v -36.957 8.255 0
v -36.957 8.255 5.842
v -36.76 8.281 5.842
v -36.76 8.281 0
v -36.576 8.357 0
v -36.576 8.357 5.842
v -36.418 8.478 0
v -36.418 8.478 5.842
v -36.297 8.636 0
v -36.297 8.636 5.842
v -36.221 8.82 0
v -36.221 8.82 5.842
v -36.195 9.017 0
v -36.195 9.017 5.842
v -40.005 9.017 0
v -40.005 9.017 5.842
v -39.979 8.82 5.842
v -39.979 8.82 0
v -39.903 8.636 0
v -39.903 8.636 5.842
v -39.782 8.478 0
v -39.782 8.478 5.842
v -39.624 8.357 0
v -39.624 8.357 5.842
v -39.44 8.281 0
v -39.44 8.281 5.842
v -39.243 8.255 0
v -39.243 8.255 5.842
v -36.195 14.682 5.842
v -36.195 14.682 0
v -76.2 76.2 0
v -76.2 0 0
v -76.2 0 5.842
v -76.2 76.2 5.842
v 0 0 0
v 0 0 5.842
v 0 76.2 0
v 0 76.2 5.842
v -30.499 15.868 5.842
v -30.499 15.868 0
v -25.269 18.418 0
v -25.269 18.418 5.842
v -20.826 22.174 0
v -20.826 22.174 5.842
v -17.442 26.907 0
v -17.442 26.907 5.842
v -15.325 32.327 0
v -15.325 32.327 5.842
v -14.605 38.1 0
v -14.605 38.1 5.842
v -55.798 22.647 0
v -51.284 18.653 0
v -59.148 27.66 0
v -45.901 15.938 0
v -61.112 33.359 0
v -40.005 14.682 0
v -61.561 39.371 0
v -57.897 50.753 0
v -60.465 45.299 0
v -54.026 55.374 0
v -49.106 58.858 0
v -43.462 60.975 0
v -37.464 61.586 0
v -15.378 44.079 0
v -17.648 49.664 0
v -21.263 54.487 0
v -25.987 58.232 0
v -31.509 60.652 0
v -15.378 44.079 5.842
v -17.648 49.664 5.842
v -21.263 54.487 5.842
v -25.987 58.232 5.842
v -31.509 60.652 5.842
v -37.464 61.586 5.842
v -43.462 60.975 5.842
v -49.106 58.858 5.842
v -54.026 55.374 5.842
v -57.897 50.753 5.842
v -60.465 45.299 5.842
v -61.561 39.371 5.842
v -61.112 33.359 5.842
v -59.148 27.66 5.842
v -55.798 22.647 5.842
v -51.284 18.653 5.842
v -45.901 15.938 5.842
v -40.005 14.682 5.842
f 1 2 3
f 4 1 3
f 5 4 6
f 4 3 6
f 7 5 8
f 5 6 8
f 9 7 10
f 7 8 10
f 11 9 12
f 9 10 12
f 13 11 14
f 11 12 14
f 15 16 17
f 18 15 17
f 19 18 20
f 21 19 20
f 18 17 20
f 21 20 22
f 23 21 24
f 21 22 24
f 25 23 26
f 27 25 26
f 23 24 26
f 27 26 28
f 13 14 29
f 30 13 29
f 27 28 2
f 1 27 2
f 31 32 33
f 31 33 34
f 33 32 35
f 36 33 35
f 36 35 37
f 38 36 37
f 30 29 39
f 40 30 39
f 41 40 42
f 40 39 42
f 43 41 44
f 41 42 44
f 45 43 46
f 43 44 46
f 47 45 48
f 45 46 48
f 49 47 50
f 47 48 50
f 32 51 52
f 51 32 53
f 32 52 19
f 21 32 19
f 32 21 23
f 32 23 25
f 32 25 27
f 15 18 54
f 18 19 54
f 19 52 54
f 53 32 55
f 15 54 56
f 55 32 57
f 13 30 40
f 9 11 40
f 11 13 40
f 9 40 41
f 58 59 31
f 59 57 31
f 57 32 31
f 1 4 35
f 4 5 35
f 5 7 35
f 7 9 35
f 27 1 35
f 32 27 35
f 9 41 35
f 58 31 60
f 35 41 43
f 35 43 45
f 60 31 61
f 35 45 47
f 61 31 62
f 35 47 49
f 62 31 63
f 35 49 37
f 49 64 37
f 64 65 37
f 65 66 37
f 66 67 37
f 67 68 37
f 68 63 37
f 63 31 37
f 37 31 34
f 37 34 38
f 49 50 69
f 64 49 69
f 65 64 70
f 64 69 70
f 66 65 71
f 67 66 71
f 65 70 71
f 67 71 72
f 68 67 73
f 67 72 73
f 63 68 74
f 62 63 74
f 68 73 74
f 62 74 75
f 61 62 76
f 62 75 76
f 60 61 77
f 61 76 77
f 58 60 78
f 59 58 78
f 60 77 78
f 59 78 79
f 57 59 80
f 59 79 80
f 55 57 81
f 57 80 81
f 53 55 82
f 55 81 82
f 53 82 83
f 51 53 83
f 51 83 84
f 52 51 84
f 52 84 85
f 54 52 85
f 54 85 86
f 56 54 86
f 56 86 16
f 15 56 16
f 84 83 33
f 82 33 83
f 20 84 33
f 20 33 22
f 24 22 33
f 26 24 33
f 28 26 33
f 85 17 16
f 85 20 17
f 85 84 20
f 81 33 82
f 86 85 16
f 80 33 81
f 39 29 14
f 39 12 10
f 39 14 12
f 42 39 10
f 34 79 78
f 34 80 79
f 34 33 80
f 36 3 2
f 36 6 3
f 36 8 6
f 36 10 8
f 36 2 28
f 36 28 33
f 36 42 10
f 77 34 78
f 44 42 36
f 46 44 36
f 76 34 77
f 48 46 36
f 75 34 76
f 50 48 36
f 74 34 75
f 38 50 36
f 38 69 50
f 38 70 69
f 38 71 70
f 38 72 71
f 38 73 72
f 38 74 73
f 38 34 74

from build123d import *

# Parameters (mm, degrees)
F0_W     = 76.2
F0_H     = 76.2
F1_DEPTH = 5.842
F3_DEPTH = 5.842


with BuildPart() as f1:
    # F0 (on Top) → F1 (new body)
    with BuildSketch(Plane.XY):
        with Locations((-38.1, 38.1)):
            Rectangle(F0_W, F0_H)
    extrude(amount=F1_DEPTH)

    # F2 (on face) → F3 (cut, through all)
    with BuildSketch(Plane.XY.offset(5.842)):
        with BuildLine():
            ThreePointArc((-36.195, 14.682357), (-38.1, 14.605), (-40.005, 14.682357))
            Line((-40.005, 14.682357), (-40.005, 9.017))
            ThreePointArc((-40.005, 9.017), (-39.781815, 8.478185), (-39.243, 8.255))
            Line((-39.243, 8.255), (-36.957, 8.255))
            ThreePointArc((-36.957, 8.255), (-36.418185, 8.478185), (-36.195, 9.017))
            Line((-36.195, 9.017), (-36.195, 14.682357))
        make_face()
        with BuildLine():
            Line((-40.005, 38.1), (-40.005, 14.682357))
            ThreePointArc((-40.005, 14.682357), (-38.1, 14.605), (-36.195, 14.682357))
            Line((-36.195, 14.682357), (-36.195, 38.1))
            Line((-36.195, 38.1), (-40.005, 38.1))
        make_face()
        with BuildLine():
            ThreePointArc((-36.195, 14.682357), (-20.826132, 22.174281), (-14.605, 38.1))
            ThreePointArc((-14.605, 38.1), (-54.025719, 55.373868), (-40.005, 14.682357))
            Line((-40.005, 14.682357), (-40.005, 38.1))
            Line((-40.005, 38.1), (-36.195, 38.1))
            Line((-36.195, 38.1), (-36.195, 14.682357))
        make_face()
    extrude(amount=-F3_DEPTH, mode=Mode.SUBTRACT)


solid = f1.part
